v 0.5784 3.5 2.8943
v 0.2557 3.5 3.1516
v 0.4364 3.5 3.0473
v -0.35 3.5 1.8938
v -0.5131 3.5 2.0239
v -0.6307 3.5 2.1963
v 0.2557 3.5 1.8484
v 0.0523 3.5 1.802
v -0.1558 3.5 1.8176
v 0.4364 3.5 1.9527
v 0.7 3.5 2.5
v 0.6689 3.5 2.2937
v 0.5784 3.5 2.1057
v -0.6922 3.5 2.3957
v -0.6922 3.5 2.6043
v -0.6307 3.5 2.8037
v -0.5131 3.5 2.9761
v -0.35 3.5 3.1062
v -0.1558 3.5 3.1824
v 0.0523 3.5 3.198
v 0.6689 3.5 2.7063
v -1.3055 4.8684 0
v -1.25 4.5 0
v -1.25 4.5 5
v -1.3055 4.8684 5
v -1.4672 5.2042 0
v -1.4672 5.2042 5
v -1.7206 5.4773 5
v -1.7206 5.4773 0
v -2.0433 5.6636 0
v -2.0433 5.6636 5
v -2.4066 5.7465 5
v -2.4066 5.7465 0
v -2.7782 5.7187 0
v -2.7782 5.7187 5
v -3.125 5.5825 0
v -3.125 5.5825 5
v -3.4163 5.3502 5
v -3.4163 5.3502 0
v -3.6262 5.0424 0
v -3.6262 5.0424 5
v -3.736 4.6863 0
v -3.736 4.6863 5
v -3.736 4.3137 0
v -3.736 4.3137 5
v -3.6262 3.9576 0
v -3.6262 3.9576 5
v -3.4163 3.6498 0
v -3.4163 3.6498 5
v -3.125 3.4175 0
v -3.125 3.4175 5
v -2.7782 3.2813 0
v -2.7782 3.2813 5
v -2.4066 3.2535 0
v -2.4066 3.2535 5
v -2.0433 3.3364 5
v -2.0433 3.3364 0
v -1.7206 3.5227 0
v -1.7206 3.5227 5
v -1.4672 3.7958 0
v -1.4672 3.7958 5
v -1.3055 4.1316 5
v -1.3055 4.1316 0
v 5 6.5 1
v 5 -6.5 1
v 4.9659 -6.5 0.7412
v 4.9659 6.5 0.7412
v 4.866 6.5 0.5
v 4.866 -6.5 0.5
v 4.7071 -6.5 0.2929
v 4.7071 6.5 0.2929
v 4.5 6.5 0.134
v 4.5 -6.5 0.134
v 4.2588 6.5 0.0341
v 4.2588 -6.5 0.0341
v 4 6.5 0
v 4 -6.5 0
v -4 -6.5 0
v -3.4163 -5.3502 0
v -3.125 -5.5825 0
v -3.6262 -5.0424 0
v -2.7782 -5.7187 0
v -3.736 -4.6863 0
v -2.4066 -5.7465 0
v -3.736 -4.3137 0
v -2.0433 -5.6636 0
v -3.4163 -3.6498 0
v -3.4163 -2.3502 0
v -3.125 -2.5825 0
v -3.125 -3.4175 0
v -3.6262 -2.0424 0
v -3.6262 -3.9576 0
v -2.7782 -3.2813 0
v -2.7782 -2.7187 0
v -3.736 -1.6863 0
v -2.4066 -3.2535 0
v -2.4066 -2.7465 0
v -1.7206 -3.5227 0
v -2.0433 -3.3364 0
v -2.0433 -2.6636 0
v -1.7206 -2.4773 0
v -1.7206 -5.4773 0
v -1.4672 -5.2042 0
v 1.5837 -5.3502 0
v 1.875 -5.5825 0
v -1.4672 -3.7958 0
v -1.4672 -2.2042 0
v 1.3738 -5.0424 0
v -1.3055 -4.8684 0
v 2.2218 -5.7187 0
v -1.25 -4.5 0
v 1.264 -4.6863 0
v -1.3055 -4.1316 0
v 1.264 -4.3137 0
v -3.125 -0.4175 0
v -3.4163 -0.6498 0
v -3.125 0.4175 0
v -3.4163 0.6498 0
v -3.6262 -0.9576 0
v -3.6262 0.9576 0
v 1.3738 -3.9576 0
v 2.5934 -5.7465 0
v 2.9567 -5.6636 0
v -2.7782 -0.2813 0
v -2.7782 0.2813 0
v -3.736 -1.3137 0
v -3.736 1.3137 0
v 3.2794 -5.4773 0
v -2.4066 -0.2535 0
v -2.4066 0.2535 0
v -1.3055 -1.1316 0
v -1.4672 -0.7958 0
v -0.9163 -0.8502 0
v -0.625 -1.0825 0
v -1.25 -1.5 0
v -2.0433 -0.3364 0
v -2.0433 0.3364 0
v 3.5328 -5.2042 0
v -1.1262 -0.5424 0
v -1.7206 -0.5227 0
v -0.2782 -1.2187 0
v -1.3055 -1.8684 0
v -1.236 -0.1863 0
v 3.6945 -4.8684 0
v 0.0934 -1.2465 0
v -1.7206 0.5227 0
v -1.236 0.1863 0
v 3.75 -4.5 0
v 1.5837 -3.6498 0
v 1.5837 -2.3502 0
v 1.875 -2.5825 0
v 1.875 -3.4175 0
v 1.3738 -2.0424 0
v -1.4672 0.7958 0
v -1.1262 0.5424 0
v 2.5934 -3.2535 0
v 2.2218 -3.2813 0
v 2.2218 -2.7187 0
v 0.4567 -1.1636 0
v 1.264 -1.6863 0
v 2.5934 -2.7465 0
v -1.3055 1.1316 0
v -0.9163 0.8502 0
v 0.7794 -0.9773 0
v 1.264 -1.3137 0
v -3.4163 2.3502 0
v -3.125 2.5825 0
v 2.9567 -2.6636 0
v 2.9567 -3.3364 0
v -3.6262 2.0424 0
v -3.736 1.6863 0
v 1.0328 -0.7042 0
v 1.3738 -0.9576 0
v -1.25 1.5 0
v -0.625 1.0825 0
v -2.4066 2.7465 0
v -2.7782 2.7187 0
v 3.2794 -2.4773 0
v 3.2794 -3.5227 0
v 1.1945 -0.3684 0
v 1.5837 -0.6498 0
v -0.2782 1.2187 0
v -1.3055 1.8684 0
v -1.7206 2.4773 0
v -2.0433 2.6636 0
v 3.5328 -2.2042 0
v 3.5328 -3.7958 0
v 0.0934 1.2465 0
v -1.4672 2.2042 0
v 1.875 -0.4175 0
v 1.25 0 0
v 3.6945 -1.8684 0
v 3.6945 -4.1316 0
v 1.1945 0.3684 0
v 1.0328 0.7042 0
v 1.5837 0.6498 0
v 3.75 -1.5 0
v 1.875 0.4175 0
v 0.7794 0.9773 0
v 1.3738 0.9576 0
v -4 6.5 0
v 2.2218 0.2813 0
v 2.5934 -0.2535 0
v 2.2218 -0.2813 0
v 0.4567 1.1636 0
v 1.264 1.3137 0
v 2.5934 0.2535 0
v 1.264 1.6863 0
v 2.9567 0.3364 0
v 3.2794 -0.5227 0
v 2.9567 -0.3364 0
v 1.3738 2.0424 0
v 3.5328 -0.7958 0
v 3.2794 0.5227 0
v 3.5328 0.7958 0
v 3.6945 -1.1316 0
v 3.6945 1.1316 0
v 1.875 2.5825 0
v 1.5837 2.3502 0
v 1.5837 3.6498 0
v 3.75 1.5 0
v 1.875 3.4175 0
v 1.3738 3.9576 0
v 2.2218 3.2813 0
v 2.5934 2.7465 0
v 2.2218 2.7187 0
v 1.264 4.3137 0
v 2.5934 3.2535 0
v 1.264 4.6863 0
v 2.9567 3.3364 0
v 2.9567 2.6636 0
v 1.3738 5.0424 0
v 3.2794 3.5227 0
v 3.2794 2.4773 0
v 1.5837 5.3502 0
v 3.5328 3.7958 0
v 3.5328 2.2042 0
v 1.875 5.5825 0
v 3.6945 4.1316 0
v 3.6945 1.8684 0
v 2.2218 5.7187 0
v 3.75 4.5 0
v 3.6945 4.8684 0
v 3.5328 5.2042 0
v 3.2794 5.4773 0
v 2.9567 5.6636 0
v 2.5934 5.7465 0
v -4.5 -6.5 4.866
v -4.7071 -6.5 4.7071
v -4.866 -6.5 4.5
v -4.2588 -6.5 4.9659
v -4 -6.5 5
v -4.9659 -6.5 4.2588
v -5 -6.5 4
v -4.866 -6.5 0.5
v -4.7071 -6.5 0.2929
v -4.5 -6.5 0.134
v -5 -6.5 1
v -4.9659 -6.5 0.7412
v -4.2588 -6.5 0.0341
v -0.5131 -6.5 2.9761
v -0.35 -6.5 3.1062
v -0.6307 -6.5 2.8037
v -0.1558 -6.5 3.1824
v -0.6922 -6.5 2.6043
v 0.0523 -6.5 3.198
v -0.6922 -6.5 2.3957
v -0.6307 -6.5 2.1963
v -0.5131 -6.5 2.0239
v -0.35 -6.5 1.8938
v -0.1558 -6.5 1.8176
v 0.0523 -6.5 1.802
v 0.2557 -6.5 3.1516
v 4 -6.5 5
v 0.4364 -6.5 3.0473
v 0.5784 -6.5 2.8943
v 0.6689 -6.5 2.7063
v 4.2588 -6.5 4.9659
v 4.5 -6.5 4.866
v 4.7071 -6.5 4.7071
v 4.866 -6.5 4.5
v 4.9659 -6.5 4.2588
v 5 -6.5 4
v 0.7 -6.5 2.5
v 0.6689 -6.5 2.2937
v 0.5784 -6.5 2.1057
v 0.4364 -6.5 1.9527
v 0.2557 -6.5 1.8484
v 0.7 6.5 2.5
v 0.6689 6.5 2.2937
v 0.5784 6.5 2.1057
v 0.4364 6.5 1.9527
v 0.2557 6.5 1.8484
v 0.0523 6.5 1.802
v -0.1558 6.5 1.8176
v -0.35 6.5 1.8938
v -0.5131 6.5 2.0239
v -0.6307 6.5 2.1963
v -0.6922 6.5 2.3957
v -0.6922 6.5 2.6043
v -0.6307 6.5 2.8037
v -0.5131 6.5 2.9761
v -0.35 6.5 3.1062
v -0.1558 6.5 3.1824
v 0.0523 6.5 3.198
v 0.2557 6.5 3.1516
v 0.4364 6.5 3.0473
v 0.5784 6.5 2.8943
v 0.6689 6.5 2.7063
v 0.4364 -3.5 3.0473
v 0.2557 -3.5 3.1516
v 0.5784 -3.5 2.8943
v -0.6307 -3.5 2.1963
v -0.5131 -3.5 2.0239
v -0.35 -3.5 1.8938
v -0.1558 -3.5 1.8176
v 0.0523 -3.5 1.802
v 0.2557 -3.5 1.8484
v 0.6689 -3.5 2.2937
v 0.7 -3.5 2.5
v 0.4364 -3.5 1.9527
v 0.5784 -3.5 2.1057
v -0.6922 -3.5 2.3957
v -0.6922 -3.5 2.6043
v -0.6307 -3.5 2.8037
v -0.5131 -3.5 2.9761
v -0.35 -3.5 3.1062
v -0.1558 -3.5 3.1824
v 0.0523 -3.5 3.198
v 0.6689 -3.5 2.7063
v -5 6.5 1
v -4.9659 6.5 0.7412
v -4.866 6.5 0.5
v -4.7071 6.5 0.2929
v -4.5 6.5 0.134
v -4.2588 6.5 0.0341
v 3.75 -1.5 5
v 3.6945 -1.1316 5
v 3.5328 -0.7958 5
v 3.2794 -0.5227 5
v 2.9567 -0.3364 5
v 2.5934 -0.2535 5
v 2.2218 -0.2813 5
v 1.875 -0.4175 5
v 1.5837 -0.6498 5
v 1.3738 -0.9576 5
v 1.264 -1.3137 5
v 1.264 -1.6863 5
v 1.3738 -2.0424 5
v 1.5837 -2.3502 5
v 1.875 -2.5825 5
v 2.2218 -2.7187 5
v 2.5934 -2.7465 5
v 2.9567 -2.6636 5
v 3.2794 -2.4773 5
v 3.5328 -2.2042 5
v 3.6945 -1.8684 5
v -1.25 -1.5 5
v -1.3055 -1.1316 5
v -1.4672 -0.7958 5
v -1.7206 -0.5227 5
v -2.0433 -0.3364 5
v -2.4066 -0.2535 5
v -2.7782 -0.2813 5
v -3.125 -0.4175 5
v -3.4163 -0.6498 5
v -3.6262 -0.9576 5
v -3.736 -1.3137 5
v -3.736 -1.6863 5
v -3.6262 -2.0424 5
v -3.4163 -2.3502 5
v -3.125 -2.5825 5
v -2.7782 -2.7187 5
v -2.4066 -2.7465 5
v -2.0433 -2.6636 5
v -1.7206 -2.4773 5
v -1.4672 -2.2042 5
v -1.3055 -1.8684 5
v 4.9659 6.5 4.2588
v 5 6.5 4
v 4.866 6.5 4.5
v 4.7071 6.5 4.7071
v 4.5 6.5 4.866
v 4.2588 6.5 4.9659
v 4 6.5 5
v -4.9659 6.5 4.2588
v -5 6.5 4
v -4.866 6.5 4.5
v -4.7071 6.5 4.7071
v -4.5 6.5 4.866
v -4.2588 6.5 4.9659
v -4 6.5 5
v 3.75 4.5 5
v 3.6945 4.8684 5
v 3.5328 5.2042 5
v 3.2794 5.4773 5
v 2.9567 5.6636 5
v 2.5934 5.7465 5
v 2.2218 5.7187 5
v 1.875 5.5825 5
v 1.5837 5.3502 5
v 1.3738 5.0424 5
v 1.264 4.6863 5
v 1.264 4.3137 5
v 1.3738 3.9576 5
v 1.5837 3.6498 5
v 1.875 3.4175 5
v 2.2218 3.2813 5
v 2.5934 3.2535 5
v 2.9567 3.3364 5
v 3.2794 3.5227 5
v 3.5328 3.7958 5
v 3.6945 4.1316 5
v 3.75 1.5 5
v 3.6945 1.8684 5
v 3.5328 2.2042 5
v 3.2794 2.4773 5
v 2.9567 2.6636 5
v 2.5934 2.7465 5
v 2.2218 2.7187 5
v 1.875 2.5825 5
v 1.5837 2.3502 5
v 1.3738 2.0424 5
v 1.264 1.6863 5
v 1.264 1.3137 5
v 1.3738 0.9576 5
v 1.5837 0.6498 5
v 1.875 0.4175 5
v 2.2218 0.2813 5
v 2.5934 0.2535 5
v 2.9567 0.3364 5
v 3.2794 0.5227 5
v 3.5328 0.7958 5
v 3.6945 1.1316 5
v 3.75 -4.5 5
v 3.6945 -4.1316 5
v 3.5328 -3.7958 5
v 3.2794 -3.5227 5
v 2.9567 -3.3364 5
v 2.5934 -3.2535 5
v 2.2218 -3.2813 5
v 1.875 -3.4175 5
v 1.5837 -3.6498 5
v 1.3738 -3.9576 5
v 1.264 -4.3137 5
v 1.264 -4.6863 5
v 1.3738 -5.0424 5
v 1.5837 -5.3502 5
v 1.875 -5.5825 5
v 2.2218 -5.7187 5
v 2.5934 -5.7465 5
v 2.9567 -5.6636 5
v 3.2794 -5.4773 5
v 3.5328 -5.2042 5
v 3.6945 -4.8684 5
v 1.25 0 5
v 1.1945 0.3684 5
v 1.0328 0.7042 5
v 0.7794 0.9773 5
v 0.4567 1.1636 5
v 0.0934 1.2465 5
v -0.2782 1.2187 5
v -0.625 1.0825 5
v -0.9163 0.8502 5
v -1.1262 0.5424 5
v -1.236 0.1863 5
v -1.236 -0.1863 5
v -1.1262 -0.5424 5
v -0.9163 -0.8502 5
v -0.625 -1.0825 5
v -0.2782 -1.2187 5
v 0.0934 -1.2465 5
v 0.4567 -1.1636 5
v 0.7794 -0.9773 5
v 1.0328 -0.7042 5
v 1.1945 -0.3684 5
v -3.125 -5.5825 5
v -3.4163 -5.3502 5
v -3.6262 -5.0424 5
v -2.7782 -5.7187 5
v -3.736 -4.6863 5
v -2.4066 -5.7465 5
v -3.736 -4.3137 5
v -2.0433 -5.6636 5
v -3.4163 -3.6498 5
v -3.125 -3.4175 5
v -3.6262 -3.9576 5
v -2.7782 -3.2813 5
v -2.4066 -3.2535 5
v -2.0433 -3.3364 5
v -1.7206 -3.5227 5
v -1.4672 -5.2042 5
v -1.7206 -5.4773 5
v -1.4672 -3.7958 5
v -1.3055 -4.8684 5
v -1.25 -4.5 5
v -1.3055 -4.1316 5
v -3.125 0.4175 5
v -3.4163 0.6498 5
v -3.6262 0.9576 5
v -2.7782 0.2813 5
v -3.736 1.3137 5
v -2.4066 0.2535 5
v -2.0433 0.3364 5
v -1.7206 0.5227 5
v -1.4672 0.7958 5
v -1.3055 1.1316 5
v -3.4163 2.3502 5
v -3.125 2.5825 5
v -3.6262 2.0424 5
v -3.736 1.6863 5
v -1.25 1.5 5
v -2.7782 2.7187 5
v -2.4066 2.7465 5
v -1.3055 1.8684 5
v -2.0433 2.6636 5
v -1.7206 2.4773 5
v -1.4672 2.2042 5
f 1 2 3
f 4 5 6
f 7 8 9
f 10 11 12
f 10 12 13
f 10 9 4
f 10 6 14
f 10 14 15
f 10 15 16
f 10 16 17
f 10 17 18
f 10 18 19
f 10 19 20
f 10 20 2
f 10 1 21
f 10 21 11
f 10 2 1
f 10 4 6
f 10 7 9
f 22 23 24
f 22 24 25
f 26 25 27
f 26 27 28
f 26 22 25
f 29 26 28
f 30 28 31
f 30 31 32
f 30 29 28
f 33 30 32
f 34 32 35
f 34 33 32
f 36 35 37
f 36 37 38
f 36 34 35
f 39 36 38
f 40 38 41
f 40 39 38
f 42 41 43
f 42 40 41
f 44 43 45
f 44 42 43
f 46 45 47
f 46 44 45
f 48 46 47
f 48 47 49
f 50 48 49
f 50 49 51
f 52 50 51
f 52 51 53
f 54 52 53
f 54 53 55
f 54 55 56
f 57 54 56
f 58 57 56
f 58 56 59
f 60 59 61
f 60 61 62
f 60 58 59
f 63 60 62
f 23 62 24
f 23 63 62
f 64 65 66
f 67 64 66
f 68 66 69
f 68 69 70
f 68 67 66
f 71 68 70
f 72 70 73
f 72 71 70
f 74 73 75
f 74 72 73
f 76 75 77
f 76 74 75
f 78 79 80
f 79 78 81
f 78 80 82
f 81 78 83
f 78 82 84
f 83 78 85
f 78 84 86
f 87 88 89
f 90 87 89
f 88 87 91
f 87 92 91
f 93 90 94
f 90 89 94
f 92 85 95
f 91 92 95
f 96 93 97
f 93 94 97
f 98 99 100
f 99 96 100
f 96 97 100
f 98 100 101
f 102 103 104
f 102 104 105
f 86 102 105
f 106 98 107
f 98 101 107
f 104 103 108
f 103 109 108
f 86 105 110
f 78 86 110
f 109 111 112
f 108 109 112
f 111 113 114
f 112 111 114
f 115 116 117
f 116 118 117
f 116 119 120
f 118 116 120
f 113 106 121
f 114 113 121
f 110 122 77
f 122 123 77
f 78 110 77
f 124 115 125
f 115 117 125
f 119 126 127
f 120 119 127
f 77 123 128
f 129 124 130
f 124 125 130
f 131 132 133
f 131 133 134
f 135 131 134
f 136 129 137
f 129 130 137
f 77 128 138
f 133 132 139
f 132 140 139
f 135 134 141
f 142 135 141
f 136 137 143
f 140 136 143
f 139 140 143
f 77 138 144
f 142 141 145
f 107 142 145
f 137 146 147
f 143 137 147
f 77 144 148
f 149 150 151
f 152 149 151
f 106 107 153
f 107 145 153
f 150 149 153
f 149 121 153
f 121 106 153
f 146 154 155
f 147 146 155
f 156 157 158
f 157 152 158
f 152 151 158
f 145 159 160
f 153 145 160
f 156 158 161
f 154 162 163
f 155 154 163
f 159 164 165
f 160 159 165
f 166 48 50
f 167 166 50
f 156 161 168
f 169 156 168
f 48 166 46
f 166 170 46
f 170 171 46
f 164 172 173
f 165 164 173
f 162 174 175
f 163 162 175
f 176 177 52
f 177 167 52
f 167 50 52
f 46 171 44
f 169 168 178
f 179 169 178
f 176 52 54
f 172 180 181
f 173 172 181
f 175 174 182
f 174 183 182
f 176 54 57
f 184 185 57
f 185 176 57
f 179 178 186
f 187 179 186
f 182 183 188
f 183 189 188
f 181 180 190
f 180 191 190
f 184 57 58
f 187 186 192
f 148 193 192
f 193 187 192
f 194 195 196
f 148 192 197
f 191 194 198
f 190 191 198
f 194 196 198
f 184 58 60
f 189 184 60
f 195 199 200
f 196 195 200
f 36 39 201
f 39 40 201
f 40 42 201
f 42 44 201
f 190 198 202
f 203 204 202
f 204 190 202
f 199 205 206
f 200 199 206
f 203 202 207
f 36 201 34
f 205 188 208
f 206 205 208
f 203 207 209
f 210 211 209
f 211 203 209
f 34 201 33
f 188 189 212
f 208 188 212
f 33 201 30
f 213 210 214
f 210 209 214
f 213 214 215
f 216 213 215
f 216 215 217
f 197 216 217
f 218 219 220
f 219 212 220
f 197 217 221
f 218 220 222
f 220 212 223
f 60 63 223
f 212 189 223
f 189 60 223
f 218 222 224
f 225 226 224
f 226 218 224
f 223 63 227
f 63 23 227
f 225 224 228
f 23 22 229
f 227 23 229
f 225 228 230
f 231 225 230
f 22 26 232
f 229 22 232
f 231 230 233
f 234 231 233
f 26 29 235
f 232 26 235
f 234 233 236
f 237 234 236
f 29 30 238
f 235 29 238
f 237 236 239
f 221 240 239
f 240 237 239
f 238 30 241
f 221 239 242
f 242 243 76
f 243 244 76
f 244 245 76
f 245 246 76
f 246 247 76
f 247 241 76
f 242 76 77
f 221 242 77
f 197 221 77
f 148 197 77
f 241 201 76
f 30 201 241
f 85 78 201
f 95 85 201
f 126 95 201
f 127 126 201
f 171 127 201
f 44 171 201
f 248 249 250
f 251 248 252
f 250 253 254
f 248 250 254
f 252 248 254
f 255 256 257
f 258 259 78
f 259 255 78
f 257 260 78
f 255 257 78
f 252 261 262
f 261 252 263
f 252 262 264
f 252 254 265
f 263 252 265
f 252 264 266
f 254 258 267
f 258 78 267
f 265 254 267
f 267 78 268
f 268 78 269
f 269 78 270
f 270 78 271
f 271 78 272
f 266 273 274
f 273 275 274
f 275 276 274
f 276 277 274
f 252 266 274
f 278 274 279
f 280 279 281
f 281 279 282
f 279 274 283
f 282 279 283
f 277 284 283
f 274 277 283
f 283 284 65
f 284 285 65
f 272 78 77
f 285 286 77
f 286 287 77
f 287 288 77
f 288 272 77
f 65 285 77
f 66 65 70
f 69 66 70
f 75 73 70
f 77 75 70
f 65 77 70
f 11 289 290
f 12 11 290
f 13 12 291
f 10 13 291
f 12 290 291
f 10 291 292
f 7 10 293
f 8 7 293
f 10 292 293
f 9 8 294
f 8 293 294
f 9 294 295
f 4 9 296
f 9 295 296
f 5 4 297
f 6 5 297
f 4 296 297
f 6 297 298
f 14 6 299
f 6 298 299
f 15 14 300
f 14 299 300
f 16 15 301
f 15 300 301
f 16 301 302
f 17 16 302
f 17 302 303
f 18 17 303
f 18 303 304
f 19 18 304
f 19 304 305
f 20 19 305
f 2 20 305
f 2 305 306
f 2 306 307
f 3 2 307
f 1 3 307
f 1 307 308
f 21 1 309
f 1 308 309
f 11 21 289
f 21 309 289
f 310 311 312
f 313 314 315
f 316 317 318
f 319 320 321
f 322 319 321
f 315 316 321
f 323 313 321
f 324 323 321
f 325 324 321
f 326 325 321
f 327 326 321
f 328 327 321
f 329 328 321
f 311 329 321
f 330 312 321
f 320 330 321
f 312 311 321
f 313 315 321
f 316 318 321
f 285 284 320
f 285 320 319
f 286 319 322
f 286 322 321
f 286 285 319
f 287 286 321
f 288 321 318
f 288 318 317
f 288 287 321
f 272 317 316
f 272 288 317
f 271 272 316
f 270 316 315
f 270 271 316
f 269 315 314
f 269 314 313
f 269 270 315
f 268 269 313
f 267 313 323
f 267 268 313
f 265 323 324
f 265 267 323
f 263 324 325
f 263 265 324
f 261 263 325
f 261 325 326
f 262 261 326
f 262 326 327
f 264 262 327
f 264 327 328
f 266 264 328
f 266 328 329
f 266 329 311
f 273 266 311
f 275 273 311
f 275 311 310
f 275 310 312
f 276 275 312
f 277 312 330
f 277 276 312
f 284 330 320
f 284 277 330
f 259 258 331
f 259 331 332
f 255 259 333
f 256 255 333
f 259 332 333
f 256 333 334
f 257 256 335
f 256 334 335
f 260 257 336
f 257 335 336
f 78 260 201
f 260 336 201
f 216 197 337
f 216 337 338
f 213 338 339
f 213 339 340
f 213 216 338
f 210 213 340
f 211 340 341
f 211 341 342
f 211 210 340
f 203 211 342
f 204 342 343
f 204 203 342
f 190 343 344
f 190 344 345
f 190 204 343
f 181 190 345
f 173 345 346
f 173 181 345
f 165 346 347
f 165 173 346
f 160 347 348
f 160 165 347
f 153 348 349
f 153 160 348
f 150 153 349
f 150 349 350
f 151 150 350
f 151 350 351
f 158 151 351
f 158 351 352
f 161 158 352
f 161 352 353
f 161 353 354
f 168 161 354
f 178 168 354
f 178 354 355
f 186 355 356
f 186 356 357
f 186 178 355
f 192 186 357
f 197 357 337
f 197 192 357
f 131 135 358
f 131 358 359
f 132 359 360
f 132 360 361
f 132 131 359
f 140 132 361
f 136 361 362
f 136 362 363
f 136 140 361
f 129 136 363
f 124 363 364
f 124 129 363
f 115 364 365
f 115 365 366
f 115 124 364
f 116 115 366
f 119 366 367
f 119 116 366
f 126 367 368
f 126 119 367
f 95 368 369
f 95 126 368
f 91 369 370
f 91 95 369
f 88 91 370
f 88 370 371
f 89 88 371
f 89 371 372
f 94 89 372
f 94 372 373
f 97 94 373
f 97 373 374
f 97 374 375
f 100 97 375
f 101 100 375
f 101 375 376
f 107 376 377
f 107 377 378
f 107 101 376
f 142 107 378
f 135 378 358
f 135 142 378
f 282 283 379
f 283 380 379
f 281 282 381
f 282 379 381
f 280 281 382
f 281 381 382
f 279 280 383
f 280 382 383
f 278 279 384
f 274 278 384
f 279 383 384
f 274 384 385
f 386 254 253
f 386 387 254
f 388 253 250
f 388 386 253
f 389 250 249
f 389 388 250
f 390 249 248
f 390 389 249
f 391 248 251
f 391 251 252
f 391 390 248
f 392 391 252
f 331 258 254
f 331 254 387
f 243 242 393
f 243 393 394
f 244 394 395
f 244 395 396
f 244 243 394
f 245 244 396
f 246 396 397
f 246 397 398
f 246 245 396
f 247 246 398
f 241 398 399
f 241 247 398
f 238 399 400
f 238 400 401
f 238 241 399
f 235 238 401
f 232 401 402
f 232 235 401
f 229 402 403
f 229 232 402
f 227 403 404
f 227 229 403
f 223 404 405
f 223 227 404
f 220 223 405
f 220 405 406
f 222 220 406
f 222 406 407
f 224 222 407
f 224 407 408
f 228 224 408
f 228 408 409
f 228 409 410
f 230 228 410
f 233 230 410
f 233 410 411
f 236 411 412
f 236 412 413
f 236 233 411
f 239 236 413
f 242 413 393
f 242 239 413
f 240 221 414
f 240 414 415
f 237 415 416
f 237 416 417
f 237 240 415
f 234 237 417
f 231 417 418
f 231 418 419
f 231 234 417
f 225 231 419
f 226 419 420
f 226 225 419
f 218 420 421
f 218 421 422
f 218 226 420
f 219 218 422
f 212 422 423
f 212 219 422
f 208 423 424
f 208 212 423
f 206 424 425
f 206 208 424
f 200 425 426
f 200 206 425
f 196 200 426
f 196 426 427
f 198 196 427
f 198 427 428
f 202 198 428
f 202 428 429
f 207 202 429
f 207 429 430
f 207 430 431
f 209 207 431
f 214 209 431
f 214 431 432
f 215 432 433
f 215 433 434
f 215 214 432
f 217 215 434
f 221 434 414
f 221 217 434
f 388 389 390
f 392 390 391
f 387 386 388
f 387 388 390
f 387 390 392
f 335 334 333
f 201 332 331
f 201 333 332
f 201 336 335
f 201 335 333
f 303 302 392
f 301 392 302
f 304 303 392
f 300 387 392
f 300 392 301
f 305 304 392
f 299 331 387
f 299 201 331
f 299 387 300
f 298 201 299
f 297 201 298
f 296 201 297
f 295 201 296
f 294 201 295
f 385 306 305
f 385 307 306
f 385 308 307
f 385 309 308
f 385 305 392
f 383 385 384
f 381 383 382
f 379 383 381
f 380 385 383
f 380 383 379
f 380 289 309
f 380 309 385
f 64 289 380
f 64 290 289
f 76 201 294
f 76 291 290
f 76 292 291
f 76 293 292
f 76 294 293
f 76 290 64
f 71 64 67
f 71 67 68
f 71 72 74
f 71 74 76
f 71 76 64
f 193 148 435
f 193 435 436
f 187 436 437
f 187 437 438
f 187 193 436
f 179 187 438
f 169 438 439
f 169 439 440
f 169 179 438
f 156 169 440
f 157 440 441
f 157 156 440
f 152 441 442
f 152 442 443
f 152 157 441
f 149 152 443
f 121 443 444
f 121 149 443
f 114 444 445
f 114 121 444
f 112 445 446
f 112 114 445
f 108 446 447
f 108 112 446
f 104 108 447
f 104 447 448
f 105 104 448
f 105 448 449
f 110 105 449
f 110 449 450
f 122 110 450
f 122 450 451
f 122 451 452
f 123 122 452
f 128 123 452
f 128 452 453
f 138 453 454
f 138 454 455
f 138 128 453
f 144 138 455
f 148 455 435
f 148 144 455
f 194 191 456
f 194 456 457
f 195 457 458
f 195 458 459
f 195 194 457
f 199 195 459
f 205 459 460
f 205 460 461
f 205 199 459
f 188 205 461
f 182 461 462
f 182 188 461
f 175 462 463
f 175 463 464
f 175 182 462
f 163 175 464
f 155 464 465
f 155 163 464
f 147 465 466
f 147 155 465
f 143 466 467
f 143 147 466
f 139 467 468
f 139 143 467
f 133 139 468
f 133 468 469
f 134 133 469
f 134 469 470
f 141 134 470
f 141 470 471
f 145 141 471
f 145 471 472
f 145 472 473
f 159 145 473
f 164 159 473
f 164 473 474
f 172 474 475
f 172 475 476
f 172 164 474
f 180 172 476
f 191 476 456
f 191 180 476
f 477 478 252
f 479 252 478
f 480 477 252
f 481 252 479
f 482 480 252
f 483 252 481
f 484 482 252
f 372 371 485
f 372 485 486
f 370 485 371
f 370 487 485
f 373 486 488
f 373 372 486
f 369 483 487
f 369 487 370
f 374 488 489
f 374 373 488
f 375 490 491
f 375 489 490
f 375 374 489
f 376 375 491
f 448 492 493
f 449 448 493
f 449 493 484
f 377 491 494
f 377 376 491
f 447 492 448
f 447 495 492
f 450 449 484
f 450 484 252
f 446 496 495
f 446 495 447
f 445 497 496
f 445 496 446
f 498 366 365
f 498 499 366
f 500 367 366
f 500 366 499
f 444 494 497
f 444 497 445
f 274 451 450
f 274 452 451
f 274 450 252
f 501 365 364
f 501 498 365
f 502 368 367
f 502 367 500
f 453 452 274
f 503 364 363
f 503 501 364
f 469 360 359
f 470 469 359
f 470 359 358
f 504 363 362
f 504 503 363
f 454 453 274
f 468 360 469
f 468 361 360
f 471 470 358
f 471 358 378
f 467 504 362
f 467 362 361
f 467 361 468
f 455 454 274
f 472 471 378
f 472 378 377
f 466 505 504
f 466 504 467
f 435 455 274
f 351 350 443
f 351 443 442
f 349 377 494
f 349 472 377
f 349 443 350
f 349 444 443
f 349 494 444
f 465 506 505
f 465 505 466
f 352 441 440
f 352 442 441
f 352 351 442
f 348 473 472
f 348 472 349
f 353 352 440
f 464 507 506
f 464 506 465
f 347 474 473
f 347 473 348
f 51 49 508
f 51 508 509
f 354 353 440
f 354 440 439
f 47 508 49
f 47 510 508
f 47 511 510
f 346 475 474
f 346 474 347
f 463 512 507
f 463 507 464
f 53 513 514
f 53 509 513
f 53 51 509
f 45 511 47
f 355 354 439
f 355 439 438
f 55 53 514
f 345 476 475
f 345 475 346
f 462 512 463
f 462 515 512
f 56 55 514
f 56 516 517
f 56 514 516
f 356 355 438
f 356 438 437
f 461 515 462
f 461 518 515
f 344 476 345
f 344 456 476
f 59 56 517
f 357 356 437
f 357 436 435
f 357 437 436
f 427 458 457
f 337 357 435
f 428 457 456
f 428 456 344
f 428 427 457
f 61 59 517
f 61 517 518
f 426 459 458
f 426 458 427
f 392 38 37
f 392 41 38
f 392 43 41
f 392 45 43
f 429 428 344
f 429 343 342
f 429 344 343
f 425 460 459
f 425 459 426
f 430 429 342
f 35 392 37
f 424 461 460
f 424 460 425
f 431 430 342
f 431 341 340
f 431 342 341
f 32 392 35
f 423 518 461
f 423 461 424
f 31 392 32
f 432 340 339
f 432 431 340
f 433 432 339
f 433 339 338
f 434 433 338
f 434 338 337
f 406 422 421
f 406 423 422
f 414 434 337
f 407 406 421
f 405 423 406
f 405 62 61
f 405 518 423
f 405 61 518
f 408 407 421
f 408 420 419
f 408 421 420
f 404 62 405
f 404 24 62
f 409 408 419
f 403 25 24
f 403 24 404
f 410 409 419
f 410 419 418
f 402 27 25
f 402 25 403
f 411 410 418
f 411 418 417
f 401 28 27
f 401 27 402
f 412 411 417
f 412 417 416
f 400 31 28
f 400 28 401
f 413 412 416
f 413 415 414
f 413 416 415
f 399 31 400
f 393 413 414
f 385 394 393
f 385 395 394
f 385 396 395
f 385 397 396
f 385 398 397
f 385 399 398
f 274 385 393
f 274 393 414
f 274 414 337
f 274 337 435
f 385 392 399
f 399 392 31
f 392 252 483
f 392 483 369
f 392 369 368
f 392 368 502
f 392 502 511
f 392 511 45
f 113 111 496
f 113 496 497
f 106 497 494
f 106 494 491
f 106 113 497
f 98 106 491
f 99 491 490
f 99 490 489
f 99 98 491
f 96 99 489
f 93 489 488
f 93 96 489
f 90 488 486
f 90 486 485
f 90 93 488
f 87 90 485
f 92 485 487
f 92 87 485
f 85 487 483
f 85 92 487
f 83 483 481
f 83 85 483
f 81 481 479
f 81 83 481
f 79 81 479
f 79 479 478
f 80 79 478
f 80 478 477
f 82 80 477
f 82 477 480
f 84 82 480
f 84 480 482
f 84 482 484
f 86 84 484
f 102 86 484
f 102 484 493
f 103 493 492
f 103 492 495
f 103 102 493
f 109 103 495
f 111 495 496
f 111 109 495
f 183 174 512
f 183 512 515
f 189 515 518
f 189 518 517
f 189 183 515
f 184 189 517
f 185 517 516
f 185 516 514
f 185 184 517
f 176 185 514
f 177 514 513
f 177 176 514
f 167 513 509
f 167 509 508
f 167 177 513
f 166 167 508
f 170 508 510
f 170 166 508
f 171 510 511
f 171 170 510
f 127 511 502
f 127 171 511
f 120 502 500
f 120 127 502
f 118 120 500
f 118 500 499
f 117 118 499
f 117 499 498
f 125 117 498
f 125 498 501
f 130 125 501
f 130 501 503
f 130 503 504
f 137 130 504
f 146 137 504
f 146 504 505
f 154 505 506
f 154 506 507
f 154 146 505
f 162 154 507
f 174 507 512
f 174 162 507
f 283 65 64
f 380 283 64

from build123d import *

# Parameters (mm, degrees)
SKETCH2_W           = 10
SKETCH2_H           = 13
SKETCH2_R           = 1.25
BOSS_EXTRUDE1_DEPTH = 5
FILLET1_R           = 1
SKETCH3_R           = 0.7
CUT_EXTRUDE1_DEPTH  = 3


with BuildPart() as part:
    # Sketch2 → Boss-Extrude1 (new body)
    with BuildSketch(Plane.XY):
        Rectangle(SKETCH2_W, SKETCH2_H)
        with Locations((-2.5, 4.5)):
            Circle(SKETCH2_R, mode=Mode.SUBTRACT)
        with Locations((2.5, 4.5)):
            Circle(SKETCH2_R, mode=Mode.SUBTRACT)
        with Locations((2.5, 1.5)):
            Circle(SKETCH2_R, mode=Mode.SUBTRACT)
        with Locations((2.5, -1.5)):
            Circle(SKETCH2_R, mode=Mode.SUBTRACT)
        with Locations((2.5, -4.5)):
            Circle(SKETCH2_R, mode=Mode.SUBTRACT)
        with Locations((-2.5, 1.5)):
            Circle(SKETCH2_R, mode=Mode.SUBTRACT)
        with Locations((-2.5, -1.5)):
            Circle(SKETCH2_R, mode=Mode.SUBTRACT)
        with Locations((-2.5, -4.5)):
            Circle(SKETCH2_R, mode=Mode.SUBTRACT)
        Circle(SKETCH2_R, mode=Mode.SUBTRACT)
    extrude(amount=BOSS_EXTRUDE1_DEPTH)

    # Fillet1
    fillet1_edges = [part.edges().sort_by_distance(p)[0] for p in [
        (-5, 0, 0),
        (5, 0, 0),
        (5, 0, 5),
        (-5, 0, 5),
    ]]
    fillet(fillet1_edges, radius=FILLET1_R)

    # Sketch3 → Cut-Extrude1 (cut)
    with BuildSketch(Plane(origin=(0, 6.5, 0), x_dir=(1, 0, 0), z_dir=(0, 1, 0))):
        with Locations((0, -2.5)):
            Circle(SKETCH3_R)
    cut_extrude1 = extrude(amount=-CUT_EXTRUDE1_DEPTH, mode=Mode.SUBTRACT)

    # Mirror1: Cut-Extrude1 across plane
    add(cut_extrude1.mirror(Plane.ZX), mode=Mode.SUBTRACT)


solid = part.part
